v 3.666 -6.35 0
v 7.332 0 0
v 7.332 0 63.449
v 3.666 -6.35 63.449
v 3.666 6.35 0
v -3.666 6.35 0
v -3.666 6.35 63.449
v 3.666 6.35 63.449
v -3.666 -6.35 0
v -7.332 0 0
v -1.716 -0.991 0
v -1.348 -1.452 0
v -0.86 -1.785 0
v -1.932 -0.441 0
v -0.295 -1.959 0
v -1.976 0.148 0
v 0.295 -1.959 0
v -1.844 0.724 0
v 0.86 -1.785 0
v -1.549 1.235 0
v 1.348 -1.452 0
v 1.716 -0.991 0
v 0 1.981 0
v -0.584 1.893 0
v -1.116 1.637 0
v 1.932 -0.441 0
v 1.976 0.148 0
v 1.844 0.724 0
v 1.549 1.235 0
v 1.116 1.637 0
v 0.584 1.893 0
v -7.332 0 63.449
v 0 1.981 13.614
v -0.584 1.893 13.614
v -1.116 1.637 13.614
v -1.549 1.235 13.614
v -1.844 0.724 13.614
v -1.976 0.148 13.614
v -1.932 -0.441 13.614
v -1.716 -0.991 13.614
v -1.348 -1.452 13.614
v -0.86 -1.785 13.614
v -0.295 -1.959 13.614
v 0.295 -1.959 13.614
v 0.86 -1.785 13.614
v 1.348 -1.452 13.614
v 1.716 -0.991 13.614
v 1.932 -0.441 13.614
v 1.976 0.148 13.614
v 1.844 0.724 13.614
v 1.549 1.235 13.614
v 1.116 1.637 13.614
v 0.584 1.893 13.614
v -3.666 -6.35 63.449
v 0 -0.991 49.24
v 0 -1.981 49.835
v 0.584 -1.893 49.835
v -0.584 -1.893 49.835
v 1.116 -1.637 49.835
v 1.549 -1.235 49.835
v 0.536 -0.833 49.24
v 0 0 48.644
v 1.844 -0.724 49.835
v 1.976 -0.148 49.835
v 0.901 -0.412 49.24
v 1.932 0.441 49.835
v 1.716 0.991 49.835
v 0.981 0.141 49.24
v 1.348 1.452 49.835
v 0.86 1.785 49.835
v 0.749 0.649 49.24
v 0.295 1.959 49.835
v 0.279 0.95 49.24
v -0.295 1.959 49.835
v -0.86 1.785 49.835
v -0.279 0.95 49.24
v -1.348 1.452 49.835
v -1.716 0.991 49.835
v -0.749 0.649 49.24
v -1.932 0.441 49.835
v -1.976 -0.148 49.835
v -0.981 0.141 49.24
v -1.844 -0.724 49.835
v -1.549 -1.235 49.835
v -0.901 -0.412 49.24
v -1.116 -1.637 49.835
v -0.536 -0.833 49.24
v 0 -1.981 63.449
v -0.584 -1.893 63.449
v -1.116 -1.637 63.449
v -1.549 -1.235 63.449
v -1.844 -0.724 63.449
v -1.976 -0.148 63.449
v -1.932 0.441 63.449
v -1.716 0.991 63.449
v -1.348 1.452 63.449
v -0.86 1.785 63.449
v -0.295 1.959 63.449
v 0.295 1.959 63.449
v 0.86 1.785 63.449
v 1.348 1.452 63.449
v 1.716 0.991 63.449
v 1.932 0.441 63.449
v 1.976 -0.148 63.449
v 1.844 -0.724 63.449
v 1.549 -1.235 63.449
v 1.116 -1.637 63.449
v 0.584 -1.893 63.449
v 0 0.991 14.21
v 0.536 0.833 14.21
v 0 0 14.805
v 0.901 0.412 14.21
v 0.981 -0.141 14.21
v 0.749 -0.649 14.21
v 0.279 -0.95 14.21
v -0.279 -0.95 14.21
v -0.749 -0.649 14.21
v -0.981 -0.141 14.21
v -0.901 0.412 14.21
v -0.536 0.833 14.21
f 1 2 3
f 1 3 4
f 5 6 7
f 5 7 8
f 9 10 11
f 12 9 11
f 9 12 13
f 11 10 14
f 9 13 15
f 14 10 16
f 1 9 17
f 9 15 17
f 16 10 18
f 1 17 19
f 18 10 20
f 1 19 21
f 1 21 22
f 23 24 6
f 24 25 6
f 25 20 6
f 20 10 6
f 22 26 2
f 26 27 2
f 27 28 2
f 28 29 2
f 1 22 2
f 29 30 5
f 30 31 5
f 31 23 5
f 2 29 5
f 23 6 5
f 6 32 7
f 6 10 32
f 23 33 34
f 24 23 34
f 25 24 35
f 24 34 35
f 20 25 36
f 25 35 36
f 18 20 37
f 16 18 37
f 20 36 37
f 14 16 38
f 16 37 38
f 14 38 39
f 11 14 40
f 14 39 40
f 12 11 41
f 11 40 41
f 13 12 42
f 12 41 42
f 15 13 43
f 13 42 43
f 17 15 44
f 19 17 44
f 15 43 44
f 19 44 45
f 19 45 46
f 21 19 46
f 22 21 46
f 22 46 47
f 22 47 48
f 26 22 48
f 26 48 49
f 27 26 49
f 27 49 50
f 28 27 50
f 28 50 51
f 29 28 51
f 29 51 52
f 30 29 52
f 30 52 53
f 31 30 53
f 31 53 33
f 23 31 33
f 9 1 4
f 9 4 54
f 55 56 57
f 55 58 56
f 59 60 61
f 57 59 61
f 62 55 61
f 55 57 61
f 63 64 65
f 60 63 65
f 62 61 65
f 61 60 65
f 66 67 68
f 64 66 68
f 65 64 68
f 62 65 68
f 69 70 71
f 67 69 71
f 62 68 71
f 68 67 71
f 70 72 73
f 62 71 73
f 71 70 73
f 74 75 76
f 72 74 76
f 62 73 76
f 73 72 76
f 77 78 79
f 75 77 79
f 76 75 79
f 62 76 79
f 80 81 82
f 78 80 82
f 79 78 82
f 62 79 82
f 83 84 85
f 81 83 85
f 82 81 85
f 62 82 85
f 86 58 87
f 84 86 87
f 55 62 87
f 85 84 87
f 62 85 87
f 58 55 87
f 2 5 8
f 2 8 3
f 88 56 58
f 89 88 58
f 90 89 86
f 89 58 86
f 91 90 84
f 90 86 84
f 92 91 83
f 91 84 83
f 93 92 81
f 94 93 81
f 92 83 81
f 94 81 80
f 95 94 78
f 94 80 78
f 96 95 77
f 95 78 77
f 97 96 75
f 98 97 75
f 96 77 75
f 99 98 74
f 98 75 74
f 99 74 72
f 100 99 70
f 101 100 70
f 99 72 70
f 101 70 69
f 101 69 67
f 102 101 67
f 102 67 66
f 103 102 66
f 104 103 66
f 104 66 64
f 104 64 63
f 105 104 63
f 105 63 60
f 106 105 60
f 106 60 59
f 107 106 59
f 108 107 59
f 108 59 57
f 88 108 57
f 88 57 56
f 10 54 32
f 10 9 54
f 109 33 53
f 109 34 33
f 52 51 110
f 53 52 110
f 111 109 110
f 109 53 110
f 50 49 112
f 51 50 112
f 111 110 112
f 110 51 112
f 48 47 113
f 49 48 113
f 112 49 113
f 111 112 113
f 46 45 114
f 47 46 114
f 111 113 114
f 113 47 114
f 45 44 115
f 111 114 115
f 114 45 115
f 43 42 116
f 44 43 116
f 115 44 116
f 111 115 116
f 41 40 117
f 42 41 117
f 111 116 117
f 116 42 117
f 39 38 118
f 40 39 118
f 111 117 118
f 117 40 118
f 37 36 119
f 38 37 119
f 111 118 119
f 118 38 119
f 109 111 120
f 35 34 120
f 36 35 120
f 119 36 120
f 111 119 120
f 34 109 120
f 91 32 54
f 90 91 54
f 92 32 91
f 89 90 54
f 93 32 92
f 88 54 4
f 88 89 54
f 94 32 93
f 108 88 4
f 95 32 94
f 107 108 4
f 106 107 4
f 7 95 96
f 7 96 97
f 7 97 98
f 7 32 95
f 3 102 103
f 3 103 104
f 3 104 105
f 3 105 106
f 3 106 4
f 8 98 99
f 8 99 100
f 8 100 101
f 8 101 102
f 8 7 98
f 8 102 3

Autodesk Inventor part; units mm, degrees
ref_plane "YZ Plane" through (0, 0, 0) normal (1, 0, 0) x (0, 1, 0)
ref_plane "XZ Plane" through (0, 0, 0) normal (0, 1, 0) x (-1, 0, 0)
ref_plane "XY Plane" through (0, 0, 0) normal (0, 0, 1) x (1, 0, 0)
sketch "Sketch1" plane through (0, 0, 0) normal (0, 0, 1) x (1, 0, 0)
  line L0 (3.6662, -6.35) -> (-3.6662, -6.35)
  line L1 (-3.6662, -6.35) -> (-7.3323, 0)
  line L2 (-7.3323, 0) -> (-3.6662, 6.35)
  line L3 (-3.6662, 6.35) -> (3.6662, 6.35)
  line L4 (3.6662, 6.35) -> (7.3323, 0)
  line L5 (7.3323, 0) -> (3.6662, -6.35)
  point P0 (0, 0)
  point P1 (0, 0)
  dimension "d0" = 12.7
extrude "Extrusion1" add sketch "Sketch1" along normal blind 63.4492
sketch "Sketch2" plane through (0, 0, 63.4492) normal (0, 0, 1) x (1, 0, 0)
  point P0 (0, 0)
  point P1 (0, 0)
hole "Hole1" at (0, 0, 63.4492) direction (0, 0, -1) diameter 3.9624 depth 13.6144 tip angle 118 thread size "10-32 UNF" class "2B" standard "ANSI Unified Screw Threads"
sketch "Sketch3" plane through (0, 0, 0) normal (0, 0, -1) x (-1, 0, 0)
  circle A0 centre (0, 0) radius 1.9812 projected
hole "Hole2" at (0, 0, 0) direction (0, 0, 1) diameter 3.9624 depth 13.6144 tip angle 118 thread size "10-32 UNF" class "2B" standard "ANSI Unified Screw Threads"
properties part number "STOCK,HEX,SHAFT,TURRET,ENCODER" material "Aluminum 6061"
